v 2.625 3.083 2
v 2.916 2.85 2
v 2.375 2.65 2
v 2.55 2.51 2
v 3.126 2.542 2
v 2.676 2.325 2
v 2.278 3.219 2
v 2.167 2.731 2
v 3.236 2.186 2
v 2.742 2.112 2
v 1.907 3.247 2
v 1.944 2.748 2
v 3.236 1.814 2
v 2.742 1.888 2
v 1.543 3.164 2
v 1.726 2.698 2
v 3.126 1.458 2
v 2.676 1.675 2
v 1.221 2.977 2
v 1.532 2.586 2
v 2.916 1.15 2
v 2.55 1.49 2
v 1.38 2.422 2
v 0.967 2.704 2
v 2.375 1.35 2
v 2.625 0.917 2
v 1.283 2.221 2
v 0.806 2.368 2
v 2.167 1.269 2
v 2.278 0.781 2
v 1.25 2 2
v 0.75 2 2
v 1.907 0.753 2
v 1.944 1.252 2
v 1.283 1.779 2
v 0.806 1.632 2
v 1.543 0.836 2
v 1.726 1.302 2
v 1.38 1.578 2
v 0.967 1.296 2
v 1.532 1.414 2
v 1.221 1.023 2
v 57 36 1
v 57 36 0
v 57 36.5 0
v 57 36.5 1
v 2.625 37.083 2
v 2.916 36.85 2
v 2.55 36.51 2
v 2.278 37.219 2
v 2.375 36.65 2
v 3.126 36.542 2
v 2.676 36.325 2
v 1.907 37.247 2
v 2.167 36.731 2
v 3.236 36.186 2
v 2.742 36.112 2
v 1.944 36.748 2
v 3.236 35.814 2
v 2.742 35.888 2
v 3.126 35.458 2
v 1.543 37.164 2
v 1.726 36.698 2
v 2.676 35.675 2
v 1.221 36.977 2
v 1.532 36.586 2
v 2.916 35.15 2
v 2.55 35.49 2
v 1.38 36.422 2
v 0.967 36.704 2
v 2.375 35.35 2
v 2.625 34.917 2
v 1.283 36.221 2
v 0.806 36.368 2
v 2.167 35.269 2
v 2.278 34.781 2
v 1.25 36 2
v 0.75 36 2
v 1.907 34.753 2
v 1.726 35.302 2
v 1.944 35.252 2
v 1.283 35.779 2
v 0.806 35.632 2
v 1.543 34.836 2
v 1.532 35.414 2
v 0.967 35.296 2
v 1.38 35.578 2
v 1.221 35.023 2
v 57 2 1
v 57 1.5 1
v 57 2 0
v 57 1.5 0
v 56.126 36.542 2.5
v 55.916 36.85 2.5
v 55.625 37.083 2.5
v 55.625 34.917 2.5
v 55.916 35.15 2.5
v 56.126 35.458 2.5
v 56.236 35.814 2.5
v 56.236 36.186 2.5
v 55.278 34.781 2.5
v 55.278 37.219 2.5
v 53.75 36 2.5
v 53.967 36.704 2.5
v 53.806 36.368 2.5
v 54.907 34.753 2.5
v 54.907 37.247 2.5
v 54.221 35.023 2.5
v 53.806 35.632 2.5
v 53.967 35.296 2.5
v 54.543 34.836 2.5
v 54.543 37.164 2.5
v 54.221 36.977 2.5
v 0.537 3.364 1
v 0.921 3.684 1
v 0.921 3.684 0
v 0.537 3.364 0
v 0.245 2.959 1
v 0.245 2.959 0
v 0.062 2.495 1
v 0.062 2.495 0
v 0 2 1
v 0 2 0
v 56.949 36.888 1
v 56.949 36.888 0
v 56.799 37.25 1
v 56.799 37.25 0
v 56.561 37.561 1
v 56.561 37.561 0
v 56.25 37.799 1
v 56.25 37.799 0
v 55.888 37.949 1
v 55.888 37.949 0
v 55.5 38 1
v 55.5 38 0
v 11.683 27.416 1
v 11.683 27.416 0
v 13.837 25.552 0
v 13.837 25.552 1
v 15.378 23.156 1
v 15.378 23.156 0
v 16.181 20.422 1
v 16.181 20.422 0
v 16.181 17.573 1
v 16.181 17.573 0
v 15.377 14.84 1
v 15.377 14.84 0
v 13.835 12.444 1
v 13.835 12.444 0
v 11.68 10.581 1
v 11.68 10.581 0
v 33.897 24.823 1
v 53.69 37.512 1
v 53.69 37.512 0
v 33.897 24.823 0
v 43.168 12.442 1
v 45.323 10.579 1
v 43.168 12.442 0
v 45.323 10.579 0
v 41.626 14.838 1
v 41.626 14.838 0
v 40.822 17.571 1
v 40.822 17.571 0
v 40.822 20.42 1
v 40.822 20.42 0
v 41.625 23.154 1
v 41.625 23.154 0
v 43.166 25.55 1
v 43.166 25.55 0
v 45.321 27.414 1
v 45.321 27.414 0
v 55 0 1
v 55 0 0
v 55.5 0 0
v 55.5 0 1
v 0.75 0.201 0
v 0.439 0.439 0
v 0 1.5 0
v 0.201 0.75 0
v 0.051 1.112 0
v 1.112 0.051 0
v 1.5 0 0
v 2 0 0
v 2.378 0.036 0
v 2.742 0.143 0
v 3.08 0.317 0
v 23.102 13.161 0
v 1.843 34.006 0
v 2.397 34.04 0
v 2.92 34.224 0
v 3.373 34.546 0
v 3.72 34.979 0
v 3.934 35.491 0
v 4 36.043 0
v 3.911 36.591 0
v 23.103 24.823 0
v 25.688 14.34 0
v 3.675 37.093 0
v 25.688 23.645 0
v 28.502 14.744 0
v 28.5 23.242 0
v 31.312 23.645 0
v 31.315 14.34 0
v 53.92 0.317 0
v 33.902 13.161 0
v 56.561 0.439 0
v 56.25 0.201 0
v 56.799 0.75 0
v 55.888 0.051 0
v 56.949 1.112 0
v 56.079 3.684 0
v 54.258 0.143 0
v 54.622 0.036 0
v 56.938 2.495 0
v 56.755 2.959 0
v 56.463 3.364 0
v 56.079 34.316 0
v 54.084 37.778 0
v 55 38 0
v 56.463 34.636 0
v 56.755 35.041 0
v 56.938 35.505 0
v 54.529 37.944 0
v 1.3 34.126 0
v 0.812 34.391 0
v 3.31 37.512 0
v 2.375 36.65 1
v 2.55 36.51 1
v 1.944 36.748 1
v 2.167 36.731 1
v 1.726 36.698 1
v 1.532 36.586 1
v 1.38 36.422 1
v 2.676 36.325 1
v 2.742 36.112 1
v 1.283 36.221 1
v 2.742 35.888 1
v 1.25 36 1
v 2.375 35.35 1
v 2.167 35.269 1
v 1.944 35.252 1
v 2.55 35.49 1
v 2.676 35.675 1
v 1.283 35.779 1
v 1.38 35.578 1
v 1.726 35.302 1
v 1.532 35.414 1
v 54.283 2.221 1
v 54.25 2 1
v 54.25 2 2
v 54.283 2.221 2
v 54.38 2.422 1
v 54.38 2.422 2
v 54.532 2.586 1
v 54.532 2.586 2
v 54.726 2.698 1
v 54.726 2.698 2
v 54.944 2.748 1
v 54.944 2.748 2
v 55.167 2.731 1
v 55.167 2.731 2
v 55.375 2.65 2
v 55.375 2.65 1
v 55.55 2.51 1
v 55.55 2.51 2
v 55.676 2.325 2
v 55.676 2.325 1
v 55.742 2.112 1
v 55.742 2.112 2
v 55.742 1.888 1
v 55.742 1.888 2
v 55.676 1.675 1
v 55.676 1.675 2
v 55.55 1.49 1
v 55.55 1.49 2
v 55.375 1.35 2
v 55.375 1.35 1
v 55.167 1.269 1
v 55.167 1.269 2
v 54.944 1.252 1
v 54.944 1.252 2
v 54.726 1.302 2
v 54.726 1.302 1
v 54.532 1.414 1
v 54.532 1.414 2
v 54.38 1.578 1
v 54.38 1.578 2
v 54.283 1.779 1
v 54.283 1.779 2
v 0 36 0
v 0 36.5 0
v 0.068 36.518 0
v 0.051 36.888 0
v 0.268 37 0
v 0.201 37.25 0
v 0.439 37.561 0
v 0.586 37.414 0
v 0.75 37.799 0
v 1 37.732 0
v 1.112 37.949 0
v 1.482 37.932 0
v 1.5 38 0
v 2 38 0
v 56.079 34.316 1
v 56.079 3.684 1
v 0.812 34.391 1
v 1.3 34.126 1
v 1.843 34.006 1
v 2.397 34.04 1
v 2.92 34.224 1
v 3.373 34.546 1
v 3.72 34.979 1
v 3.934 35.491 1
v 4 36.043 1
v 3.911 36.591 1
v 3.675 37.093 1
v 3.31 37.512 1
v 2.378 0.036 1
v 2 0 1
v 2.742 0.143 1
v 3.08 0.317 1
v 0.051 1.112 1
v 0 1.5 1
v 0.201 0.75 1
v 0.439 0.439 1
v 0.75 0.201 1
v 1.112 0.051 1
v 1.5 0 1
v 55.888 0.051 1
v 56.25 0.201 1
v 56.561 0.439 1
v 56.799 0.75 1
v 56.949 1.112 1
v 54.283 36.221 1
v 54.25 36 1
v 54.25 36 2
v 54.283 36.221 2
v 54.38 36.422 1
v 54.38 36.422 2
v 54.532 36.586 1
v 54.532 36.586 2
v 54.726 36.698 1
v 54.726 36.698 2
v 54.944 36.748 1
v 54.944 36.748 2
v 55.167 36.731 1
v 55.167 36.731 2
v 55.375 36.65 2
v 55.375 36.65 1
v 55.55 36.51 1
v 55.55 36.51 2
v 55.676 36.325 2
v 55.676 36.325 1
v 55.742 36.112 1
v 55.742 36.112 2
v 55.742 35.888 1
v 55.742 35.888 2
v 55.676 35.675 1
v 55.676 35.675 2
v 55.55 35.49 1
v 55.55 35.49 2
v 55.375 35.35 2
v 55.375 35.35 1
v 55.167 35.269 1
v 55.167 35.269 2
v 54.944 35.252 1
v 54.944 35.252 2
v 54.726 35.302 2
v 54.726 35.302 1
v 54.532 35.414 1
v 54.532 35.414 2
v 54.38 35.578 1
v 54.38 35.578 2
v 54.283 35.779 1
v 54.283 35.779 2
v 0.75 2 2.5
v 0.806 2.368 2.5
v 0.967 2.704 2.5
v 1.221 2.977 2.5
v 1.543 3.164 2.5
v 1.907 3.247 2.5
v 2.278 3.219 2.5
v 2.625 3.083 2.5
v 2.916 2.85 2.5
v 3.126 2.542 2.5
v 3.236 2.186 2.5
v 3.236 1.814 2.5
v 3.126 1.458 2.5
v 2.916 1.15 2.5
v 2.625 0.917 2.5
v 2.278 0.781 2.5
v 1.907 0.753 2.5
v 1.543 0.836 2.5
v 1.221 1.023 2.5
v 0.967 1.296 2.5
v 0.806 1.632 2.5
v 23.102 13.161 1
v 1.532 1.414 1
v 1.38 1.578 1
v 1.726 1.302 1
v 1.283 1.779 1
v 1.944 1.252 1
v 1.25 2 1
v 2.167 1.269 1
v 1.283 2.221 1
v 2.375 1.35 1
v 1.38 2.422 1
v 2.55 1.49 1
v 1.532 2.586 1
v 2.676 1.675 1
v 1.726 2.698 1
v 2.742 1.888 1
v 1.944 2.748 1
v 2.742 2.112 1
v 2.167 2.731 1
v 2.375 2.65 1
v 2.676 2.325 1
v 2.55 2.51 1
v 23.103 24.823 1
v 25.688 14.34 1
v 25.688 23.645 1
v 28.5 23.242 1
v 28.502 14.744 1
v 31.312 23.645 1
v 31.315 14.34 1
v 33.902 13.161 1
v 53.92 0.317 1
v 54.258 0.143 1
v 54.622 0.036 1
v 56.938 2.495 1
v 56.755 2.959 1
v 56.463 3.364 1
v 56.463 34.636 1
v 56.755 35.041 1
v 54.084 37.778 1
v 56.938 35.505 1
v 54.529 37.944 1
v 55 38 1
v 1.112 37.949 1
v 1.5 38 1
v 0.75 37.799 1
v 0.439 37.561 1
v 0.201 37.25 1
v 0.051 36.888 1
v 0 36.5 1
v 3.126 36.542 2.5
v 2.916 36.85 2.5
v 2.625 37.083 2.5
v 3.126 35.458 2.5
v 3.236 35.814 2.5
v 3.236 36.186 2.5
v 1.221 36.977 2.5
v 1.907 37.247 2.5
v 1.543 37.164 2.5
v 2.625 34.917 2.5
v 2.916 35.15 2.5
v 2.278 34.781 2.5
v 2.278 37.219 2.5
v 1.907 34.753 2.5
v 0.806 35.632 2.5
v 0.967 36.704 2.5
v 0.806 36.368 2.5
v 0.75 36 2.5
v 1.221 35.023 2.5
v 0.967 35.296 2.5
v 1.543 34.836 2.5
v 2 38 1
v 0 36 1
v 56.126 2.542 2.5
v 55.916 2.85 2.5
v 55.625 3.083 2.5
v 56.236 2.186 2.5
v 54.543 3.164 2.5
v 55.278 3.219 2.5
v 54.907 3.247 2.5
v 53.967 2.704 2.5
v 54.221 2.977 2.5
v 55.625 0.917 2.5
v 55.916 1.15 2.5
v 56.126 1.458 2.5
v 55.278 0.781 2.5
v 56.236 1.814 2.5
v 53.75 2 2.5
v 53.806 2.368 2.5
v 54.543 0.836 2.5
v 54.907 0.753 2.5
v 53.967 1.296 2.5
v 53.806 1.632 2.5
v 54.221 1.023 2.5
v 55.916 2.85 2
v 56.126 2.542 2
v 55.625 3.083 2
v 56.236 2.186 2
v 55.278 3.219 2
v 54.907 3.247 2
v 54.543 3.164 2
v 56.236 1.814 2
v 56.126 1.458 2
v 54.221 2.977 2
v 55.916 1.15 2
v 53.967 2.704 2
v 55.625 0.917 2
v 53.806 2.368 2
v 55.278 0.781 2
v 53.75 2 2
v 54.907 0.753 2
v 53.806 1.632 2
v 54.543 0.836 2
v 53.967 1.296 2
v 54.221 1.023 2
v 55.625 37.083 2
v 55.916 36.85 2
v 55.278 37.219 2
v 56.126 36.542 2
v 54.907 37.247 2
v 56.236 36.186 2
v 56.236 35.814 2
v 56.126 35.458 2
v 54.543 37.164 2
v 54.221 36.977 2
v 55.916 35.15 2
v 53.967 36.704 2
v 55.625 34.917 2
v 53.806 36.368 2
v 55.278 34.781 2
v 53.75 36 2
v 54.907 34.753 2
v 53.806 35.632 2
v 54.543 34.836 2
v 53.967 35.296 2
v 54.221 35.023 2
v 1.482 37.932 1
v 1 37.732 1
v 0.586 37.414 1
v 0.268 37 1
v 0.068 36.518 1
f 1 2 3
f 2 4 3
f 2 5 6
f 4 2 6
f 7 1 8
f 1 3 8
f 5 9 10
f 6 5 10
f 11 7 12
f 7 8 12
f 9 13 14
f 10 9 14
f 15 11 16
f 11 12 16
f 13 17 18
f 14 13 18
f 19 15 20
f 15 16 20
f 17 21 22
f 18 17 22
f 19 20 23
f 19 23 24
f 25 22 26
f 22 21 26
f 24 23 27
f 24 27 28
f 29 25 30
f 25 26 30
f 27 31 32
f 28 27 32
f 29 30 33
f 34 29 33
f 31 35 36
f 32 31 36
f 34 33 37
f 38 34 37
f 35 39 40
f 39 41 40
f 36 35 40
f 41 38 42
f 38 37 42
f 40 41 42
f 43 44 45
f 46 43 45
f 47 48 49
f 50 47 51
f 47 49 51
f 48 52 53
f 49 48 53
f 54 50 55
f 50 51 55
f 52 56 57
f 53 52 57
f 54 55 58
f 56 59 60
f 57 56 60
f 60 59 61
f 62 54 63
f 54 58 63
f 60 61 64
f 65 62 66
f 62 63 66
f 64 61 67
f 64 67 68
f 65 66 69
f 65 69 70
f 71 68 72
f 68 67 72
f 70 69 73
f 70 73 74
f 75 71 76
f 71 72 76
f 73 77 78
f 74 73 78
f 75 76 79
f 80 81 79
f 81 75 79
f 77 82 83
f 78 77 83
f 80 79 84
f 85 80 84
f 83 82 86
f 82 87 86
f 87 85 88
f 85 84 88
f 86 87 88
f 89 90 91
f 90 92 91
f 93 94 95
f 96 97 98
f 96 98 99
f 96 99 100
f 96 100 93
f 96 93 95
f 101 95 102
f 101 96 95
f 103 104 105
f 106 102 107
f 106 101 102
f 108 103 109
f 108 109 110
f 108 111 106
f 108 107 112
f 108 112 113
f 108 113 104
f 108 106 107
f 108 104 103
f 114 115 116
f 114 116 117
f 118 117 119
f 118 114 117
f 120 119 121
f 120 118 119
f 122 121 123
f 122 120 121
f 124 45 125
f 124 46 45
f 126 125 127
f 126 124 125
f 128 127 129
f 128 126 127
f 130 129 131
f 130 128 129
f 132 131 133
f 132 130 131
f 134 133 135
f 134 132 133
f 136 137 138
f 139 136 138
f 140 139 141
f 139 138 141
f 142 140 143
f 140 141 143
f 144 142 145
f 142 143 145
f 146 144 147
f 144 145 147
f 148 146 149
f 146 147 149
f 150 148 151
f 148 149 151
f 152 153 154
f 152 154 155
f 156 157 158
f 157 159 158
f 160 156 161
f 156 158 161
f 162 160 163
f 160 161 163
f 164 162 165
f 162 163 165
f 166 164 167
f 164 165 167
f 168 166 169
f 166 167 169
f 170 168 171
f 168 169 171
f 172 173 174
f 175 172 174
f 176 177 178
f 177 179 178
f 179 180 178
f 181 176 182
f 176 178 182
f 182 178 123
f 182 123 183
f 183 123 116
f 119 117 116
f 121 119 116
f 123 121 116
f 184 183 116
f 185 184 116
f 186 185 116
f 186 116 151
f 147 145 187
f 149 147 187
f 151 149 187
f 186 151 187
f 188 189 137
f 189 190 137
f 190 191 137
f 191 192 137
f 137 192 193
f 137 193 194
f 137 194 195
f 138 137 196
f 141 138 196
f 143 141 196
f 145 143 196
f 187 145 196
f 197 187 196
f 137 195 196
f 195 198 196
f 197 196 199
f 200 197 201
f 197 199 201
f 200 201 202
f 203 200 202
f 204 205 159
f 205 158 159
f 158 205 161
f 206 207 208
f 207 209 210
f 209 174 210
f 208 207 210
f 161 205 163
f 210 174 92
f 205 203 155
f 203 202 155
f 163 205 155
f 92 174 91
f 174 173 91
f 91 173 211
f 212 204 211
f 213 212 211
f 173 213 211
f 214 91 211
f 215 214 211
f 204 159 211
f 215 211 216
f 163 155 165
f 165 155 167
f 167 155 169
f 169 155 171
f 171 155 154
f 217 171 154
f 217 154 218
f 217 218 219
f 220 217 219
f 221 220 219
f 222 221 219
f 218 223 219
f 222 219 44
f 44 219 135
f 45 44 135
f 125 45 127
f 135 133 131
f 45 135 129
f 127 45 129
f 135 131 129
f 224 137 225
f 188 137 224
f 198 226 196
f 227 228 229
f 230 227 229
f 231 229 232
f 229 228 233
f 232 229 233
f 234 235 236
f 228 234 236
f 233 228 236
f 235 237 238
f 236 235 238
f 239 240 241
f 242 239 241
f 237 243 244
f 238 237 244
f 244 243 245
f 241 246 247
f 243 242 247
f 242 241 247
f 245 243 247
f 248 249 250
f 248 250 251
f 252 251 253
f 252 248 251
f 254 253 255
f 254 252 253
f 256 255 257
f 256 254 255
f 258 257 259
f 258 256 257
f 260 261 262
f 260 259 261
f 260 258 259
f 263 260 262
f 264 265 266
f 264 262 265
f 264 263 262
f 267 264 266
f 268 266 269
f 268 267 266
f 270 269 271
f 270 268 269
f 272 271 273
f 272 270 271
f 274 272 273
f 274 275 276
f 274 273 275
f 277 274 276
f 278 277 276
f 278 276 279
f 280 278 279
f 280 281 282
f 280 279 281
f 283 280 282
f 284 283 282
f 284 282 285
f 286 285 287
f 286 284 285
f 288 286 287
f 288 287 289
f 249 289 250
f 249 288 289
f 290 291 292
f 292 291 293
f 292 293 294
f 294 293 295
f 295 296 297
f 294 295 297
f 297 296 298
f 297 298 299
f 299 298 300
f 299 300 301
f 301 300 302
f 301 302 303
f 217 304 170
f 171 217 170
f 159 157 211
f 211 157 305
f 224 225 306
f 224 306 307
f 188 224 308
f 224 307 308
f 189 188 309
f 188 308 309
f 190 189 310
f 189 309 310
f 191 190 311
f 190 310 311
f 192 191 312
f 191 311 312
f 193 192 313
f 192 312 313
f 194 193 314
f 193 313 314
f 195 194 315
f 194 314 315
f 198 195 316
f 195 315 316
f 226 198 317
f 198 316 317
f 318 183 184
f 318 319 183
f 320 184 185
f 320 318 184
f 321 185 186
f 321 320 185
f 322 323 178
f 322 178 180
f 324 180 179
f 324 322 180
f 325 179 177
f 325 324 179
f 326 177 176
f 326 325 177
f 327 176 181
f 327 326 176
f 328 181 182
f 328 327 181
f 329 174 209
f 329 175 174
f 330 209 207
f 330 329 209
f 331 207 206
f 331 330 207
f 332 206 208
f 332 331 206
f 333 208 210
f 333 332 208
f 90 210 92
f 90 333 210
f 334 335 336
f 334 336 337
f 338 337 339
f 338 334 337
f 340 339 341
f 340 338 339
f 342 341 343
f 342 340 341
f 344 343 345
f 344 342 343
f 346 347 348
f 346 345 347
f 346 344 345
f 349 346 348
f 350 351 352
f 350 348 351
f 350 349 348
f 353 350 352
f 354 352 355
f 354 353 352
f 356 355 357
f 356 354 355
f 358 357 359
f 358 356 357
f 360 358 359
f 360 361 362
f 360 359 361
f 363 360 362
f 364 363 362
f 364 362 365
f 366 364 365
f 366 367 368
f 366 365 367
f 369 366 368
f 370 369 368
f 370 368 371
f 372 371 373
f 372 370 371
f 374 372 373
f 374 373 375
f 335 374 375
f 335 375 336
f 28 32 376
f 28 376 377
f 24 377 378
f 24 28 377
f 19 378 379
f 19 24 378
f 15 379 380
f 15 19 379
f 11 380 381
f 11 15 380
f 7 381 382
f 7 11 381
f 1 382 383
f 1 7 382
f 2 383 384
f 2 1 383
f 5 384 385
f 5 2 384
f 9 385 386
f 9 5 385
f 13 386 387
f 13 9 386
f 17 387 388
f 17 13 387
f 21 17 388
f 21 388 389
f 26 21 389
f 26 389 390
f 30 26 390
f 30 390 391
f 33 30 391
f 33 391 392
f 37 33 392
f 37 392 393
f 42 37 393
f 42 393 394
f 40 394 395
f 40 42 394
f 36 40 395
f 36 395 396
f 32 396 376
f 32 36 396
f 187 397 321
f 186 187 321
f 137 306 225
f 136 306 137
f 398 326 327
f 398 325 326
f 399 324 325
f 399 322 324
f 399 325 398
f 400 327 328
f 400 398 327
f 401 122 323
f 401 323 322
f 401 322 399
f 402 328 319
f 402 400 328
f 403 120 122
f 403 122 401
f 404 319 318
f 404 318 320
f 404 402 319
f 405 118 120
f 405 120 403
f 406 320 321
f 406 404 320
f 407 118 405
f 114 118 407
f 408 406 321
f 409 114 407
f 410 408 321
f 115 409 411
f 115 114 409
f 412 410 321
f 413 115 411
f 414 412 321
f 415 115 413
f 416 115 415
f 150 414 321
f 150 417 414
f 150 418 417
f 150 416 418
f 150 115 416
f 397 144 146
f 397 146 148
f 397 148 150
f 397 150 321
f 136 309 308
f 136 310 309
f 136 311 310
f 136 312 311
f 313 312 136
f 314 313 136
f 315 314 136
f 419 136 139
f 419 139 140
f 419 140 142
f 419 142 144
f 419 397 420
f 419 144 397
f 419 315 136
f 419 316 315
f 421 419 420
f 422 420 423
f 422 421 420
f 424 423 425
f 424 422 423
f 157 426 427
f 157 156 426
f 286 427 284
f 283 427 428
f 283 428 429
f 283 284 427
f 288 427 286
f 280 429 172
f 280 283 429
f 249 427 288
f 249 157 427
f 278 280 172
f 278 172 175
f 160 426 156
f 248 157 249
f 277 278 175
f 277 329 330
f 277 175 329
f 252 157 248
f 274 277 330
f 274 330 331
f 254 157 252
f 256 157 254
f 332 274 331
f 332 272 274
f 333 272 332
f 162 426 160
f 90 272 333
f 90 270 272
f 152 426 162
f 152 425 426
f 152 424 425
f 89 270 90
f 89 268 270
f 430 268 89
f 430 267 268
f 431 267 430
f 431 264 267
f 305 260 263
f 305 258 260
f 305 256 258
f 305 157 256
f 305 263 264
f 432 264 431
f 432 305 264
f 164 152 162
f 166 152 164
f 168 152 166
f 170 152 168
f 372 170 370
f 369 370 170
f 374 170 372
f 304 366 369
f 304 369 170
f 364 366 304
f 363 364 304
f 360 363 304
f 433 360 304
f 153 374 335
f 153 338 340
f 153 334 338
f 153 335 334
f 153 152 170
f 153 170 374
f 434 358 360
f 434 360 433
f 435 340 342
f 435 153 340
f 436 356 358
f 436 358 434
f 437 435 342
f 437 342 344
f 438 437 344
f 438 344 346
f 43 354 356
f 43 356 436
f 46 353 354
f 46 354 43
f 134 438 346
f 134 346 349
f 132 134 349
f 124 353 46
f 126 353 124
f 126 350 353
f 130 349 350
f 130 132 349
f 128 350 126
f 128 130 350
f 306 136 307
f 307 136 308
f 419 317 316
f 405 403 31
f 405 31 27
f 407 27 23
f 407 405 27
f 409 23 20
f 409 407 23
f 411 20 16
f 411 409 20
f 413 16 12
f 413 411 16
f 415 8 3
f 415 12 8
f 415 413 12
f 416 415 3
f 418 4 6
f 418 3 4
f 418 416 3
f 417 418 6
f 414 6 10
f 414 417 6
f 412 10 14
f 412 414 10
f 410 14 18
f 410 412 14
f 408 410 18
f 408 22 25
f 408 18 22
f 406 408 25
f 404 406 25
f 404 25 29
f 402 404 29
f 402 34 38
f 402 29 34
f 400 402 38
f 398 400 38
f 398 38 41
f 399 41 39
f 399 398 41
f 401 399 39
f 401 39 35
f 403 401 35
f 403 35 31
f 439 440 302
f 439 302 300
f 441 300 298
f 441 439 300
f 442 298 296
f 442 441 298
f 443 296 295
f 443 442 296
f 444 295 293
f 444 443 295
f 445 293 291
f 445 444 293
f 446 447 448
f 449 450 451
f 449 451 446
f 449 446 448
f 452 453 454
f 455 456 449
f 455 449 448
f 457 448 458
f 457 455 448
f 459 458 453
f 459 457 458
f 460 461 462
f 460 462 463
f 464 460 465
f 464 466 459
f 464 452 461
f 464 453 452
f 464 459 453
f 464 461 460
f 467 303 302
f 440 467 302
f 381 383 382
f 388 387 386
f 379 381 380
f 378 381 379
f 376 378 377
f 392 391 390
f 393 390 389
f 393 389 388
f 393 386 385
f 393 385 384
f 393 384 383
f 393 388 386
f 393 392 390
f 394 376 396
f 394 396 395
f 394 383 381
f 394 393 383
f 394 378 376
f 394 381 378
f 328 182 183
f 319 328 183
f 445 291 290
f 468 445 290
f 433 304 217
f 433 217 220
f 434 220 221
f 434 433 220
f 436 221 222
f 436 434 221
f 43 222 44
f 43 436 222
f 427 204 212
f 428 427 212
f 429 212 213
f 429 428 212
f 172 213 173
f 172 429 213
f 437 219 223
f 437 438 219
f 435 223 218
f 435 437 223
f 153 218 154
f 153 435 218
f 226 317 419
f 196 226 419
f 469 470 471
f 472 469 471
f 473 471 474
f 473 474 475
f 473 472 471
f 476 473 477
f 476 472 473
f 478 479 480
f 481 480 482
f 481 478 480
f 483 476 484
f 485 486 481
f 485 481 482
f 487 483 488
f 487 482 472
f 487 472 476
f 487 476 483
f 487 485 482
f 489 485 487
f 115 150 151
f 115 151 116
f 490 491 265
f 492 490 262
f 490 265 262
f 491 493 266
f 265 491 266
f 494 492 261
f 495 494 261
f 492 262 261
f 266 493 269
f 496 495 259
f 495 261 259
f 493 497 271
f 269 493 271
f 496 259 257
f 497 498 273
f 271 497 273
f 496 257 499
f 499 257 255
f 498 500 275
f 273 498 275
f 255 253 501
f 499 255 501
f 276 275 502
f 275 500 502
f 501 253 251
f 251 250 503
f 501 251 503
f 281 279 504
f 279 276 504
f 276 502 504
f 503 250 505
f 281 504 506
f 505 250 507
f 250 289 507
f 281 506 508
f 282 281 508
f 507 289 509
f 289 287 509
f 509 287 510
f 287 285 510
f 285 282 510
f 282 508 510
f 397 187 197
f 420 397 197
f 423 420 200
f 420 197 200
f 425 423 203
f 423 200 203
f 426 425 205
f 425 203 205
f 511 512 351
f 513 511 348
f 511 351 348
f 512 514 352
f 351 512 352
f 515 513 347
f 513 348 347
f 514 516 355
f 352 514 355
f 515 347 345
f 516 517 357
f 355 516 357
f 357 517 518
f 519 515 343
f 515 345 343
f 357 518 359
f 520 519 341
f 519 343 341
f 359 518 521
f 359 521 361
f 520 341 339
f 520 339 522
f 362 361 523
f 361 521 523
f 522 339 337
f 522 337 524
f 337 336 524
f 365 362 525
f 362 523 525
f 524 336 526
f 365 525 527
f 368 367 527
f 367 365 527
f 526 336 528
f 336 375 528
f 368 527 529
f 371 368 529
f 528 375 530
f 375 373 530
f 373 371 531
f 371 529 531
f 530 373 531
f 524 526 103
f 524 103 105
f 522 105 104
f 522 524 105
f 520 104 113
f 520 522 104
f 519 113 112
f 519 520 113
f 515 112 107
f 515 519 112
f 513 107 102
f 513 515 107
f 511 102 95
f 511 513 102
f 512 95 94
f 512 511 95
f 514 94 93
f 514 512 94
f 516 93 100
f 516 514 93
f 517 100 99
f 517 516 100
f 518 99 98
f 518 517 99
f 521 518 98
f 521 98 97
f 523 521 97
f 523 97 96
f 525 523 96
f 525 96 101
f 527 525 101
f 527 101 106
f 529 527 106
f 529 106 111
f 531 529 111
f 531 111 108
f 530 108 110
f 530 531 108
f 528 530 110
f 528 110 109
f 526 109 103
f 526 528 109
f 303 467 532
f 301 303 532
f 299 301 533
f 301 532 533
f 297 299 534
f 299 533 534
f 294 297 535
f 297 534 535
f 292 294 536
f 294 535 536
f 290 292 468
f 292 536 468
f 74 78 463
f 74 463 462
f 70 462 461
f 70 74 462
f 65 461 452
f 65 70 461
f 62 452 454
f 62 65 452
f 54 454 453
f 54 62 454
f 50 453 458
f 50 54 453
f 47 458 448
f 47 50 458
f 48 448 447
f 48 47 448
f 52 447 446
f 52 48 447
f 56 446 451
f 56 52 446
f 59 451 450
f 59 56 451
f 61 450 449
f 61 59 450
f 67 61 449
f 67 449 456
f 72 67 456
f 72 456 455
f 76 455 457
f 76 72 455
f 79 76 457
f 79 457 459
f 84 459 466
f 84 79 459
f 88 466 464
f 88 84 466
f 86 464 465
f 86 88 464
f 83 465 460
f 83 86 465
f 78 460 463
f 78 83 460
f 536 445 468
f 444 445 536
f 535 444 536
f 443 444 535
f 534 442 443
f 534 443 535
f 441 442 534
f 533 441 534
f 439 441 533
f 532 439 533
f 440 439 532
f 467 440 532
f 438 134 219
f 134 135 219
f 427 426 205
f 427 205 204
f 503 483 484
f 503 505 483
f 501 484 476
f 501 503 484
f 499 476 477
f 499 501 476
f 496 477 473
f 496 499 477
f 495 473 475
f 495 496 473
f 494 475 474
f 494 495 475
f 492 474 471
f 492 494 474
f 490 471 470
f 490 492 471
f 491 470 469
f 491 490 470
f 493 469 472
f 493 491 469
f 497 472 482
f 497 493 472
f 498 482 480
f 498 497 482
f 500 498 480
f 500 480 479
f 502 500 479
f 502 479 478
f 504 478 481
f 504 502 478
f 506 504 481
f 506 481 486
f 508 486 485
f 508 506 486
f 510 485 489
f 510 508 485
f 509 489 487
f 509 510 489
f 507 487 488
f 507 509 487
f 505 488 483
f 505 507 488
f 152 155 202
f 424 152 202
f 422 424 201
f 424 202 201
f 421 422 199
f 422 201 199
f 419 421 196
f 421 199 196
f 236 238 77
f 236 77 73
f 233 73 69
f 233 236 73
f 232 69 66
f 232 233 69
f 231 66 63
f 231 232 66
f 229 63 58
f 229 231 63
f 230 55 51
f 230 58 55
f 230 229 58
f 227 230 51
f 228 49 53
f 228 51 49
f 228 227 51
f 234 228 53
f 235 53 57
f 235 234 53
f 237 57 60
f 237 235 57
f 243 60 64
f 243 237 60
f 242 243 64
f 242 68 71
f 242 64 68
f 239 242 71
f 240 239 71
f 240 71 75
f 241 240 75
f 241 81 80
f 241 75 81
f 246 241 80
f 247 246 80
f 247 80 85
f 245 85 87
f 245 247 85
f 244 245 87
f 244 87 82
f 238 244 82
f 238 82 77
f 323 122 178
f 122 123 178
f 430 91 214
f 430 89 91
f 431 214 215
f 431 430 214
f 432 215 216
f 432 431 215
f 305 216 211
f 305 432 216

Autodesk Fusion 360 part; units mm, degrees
sketch "Skizze1" plane through (0, 0, 0) normal (0, 0, 1) x (1, 0, 0)
  line L0 (0, 0) -> (57, 0)
  line L1 (57, 0) -> (57, 38)
  line L2 (57, 38) -> (0, 38)
  line L3 (0, 38) -> (0, 0)
  dimension "d1" = 57
  dimension "d2" = 38
extrude "Extrusion1" add sketch "Skizze1" along normal blind 1
sketch "Skizze2" plane through (0, 0, 1) normal (0, 0, 1) x (-1, 0, 0)
  line L0 (0, -38) -> (0, 0)
  line L1 (0, 0) -> (-57, 0)
  line L2 (-57, 0) -> (-57, -38)
  line L3 (-57, -38) -> (0, -38)
  circle A0 centre (-2, -36) radius 0.75
  circle A1 centre (-55, -36) radius 0.75
  circle A2 centre (-2, -2) radius 0.75
  circle A3 centre (-55, -2) radius 0.75
  line L4 (-2, -36) -> (-55, -36) construction
  line L5 (-55, -36) -> (-55, -2) construction
  line L6 (-55, -2) -> (-2, -2) construction
  line L7 (-2, -2) -> (-2, -36) construction
  line L8 (-28.5, -38) -> (-28.5, 0) construction
  line L9 (0, -19) -> (-57, -19) construction
  dimension "d5" = 1.5
  dimension "d6" = 1.5
  dimension "d7" = 1.5
  dimension "d8" = 1.5
  dimension "d9" = 53
  dimension "d10" = 53
  dimension "d11" = 26.5
  dimension "d12" = 17
  dimension "d13" = 34
extrude "Extrusion2" add sketch "Skizze2" along normal blind 1 contours A0 | A1 | A2 | A3
sketch "Skizze3" plane through (0, 0, 2) normal (0, 0, 1) x (-1, 0, 0)
  circle A0 centre (-2, -36) radius 0.75
  circle A1 centre (-2, -36) radius 1.25
  circle A2 centre (-55, -36) radius 1.25
  circle A3 centre (-2, -2) radius 1.25
  circle A4 centre (-55, -2) radius 1.25
  dimension "d16" = 2.5
  dimension "d17" = 2.5
  dimension "d18" = 2.5
  dimension "d19" = 2.5
extrude "Extrusion3" add sketch "Skizze3" along normal blind 0.5 contours A0 | A1 | A2 | A3 | A4
sketch "Skizze4" plane through (0, 0, 1) normal (0, 0, 1) x (-1, 0, 0)
  circle A0 centre (-2, -2) radius 0.75
  circle A1 centre (-2, -36) radius 0.75
  circle A2 centre (-55, -2) radius 0.75
  circle A3 centre (-55, -36) radius 0.75
  line L0 (0, -38) -> (0, 0)
  line L1 (0, 0) -> (-57, 0)
  line L2 (-57, 0) -> (-57, -38)
  line L3 (-57, -38) -> (0, -38)
  circle A4 centre (-2, -36) radius 2
  circle A5 centre (-55, -36) radius 2
  circle A6 centre (-55, -2) radius 2
  circle A7 centre (-2, -2) radius 2
  line L4 (-53.6905, -37.5117) -> (-28.5, -21.3634)
  line L5 (-24.8068, -18.9959) -> (-0.9206, -3.6837)
  line L6 (-0.8123, -34.3908) -> (-24.8068, -18.9959)
  line L7 (-28.5019, -16.6251) -> (-53.92, -0.3167)
  line L8 (-56.0794, -34.3163) -> (-32.1954, -18.9945)
  line L9 (-28.5019, -16.6251) -> (-3.0799, -0.3166)
  line L10 (-3.3095, -37.5117) -> (-28.5, -21.3634)
  line L11 (-32.1954, -18.9945) -> (-56.0794, -3.6837)
extrude "Extrusion4" cut sketch "Skizze4" against normal blind 4 contours A1 | L0 A4 A7 L5 L6 | L3 A4 A5 L4 L10 | L1 A6 A7 L7 L9 | L2 A5 A6 L8 L11
fillet "Abrundung1" radius 1.5 4 edges at (0, 0, 0.5) (57, 0, 0.5) (57, 38, 0.5) (0, 38, 0.5)
fillet "Abrundung2" radius 10 4 edges at (28.5019, 16.6251, 0.5) (24.8068, 18.9959, 0.5) (28.5, 21.3634, 0.5) (32.1954, 18.9945, 0.5)
